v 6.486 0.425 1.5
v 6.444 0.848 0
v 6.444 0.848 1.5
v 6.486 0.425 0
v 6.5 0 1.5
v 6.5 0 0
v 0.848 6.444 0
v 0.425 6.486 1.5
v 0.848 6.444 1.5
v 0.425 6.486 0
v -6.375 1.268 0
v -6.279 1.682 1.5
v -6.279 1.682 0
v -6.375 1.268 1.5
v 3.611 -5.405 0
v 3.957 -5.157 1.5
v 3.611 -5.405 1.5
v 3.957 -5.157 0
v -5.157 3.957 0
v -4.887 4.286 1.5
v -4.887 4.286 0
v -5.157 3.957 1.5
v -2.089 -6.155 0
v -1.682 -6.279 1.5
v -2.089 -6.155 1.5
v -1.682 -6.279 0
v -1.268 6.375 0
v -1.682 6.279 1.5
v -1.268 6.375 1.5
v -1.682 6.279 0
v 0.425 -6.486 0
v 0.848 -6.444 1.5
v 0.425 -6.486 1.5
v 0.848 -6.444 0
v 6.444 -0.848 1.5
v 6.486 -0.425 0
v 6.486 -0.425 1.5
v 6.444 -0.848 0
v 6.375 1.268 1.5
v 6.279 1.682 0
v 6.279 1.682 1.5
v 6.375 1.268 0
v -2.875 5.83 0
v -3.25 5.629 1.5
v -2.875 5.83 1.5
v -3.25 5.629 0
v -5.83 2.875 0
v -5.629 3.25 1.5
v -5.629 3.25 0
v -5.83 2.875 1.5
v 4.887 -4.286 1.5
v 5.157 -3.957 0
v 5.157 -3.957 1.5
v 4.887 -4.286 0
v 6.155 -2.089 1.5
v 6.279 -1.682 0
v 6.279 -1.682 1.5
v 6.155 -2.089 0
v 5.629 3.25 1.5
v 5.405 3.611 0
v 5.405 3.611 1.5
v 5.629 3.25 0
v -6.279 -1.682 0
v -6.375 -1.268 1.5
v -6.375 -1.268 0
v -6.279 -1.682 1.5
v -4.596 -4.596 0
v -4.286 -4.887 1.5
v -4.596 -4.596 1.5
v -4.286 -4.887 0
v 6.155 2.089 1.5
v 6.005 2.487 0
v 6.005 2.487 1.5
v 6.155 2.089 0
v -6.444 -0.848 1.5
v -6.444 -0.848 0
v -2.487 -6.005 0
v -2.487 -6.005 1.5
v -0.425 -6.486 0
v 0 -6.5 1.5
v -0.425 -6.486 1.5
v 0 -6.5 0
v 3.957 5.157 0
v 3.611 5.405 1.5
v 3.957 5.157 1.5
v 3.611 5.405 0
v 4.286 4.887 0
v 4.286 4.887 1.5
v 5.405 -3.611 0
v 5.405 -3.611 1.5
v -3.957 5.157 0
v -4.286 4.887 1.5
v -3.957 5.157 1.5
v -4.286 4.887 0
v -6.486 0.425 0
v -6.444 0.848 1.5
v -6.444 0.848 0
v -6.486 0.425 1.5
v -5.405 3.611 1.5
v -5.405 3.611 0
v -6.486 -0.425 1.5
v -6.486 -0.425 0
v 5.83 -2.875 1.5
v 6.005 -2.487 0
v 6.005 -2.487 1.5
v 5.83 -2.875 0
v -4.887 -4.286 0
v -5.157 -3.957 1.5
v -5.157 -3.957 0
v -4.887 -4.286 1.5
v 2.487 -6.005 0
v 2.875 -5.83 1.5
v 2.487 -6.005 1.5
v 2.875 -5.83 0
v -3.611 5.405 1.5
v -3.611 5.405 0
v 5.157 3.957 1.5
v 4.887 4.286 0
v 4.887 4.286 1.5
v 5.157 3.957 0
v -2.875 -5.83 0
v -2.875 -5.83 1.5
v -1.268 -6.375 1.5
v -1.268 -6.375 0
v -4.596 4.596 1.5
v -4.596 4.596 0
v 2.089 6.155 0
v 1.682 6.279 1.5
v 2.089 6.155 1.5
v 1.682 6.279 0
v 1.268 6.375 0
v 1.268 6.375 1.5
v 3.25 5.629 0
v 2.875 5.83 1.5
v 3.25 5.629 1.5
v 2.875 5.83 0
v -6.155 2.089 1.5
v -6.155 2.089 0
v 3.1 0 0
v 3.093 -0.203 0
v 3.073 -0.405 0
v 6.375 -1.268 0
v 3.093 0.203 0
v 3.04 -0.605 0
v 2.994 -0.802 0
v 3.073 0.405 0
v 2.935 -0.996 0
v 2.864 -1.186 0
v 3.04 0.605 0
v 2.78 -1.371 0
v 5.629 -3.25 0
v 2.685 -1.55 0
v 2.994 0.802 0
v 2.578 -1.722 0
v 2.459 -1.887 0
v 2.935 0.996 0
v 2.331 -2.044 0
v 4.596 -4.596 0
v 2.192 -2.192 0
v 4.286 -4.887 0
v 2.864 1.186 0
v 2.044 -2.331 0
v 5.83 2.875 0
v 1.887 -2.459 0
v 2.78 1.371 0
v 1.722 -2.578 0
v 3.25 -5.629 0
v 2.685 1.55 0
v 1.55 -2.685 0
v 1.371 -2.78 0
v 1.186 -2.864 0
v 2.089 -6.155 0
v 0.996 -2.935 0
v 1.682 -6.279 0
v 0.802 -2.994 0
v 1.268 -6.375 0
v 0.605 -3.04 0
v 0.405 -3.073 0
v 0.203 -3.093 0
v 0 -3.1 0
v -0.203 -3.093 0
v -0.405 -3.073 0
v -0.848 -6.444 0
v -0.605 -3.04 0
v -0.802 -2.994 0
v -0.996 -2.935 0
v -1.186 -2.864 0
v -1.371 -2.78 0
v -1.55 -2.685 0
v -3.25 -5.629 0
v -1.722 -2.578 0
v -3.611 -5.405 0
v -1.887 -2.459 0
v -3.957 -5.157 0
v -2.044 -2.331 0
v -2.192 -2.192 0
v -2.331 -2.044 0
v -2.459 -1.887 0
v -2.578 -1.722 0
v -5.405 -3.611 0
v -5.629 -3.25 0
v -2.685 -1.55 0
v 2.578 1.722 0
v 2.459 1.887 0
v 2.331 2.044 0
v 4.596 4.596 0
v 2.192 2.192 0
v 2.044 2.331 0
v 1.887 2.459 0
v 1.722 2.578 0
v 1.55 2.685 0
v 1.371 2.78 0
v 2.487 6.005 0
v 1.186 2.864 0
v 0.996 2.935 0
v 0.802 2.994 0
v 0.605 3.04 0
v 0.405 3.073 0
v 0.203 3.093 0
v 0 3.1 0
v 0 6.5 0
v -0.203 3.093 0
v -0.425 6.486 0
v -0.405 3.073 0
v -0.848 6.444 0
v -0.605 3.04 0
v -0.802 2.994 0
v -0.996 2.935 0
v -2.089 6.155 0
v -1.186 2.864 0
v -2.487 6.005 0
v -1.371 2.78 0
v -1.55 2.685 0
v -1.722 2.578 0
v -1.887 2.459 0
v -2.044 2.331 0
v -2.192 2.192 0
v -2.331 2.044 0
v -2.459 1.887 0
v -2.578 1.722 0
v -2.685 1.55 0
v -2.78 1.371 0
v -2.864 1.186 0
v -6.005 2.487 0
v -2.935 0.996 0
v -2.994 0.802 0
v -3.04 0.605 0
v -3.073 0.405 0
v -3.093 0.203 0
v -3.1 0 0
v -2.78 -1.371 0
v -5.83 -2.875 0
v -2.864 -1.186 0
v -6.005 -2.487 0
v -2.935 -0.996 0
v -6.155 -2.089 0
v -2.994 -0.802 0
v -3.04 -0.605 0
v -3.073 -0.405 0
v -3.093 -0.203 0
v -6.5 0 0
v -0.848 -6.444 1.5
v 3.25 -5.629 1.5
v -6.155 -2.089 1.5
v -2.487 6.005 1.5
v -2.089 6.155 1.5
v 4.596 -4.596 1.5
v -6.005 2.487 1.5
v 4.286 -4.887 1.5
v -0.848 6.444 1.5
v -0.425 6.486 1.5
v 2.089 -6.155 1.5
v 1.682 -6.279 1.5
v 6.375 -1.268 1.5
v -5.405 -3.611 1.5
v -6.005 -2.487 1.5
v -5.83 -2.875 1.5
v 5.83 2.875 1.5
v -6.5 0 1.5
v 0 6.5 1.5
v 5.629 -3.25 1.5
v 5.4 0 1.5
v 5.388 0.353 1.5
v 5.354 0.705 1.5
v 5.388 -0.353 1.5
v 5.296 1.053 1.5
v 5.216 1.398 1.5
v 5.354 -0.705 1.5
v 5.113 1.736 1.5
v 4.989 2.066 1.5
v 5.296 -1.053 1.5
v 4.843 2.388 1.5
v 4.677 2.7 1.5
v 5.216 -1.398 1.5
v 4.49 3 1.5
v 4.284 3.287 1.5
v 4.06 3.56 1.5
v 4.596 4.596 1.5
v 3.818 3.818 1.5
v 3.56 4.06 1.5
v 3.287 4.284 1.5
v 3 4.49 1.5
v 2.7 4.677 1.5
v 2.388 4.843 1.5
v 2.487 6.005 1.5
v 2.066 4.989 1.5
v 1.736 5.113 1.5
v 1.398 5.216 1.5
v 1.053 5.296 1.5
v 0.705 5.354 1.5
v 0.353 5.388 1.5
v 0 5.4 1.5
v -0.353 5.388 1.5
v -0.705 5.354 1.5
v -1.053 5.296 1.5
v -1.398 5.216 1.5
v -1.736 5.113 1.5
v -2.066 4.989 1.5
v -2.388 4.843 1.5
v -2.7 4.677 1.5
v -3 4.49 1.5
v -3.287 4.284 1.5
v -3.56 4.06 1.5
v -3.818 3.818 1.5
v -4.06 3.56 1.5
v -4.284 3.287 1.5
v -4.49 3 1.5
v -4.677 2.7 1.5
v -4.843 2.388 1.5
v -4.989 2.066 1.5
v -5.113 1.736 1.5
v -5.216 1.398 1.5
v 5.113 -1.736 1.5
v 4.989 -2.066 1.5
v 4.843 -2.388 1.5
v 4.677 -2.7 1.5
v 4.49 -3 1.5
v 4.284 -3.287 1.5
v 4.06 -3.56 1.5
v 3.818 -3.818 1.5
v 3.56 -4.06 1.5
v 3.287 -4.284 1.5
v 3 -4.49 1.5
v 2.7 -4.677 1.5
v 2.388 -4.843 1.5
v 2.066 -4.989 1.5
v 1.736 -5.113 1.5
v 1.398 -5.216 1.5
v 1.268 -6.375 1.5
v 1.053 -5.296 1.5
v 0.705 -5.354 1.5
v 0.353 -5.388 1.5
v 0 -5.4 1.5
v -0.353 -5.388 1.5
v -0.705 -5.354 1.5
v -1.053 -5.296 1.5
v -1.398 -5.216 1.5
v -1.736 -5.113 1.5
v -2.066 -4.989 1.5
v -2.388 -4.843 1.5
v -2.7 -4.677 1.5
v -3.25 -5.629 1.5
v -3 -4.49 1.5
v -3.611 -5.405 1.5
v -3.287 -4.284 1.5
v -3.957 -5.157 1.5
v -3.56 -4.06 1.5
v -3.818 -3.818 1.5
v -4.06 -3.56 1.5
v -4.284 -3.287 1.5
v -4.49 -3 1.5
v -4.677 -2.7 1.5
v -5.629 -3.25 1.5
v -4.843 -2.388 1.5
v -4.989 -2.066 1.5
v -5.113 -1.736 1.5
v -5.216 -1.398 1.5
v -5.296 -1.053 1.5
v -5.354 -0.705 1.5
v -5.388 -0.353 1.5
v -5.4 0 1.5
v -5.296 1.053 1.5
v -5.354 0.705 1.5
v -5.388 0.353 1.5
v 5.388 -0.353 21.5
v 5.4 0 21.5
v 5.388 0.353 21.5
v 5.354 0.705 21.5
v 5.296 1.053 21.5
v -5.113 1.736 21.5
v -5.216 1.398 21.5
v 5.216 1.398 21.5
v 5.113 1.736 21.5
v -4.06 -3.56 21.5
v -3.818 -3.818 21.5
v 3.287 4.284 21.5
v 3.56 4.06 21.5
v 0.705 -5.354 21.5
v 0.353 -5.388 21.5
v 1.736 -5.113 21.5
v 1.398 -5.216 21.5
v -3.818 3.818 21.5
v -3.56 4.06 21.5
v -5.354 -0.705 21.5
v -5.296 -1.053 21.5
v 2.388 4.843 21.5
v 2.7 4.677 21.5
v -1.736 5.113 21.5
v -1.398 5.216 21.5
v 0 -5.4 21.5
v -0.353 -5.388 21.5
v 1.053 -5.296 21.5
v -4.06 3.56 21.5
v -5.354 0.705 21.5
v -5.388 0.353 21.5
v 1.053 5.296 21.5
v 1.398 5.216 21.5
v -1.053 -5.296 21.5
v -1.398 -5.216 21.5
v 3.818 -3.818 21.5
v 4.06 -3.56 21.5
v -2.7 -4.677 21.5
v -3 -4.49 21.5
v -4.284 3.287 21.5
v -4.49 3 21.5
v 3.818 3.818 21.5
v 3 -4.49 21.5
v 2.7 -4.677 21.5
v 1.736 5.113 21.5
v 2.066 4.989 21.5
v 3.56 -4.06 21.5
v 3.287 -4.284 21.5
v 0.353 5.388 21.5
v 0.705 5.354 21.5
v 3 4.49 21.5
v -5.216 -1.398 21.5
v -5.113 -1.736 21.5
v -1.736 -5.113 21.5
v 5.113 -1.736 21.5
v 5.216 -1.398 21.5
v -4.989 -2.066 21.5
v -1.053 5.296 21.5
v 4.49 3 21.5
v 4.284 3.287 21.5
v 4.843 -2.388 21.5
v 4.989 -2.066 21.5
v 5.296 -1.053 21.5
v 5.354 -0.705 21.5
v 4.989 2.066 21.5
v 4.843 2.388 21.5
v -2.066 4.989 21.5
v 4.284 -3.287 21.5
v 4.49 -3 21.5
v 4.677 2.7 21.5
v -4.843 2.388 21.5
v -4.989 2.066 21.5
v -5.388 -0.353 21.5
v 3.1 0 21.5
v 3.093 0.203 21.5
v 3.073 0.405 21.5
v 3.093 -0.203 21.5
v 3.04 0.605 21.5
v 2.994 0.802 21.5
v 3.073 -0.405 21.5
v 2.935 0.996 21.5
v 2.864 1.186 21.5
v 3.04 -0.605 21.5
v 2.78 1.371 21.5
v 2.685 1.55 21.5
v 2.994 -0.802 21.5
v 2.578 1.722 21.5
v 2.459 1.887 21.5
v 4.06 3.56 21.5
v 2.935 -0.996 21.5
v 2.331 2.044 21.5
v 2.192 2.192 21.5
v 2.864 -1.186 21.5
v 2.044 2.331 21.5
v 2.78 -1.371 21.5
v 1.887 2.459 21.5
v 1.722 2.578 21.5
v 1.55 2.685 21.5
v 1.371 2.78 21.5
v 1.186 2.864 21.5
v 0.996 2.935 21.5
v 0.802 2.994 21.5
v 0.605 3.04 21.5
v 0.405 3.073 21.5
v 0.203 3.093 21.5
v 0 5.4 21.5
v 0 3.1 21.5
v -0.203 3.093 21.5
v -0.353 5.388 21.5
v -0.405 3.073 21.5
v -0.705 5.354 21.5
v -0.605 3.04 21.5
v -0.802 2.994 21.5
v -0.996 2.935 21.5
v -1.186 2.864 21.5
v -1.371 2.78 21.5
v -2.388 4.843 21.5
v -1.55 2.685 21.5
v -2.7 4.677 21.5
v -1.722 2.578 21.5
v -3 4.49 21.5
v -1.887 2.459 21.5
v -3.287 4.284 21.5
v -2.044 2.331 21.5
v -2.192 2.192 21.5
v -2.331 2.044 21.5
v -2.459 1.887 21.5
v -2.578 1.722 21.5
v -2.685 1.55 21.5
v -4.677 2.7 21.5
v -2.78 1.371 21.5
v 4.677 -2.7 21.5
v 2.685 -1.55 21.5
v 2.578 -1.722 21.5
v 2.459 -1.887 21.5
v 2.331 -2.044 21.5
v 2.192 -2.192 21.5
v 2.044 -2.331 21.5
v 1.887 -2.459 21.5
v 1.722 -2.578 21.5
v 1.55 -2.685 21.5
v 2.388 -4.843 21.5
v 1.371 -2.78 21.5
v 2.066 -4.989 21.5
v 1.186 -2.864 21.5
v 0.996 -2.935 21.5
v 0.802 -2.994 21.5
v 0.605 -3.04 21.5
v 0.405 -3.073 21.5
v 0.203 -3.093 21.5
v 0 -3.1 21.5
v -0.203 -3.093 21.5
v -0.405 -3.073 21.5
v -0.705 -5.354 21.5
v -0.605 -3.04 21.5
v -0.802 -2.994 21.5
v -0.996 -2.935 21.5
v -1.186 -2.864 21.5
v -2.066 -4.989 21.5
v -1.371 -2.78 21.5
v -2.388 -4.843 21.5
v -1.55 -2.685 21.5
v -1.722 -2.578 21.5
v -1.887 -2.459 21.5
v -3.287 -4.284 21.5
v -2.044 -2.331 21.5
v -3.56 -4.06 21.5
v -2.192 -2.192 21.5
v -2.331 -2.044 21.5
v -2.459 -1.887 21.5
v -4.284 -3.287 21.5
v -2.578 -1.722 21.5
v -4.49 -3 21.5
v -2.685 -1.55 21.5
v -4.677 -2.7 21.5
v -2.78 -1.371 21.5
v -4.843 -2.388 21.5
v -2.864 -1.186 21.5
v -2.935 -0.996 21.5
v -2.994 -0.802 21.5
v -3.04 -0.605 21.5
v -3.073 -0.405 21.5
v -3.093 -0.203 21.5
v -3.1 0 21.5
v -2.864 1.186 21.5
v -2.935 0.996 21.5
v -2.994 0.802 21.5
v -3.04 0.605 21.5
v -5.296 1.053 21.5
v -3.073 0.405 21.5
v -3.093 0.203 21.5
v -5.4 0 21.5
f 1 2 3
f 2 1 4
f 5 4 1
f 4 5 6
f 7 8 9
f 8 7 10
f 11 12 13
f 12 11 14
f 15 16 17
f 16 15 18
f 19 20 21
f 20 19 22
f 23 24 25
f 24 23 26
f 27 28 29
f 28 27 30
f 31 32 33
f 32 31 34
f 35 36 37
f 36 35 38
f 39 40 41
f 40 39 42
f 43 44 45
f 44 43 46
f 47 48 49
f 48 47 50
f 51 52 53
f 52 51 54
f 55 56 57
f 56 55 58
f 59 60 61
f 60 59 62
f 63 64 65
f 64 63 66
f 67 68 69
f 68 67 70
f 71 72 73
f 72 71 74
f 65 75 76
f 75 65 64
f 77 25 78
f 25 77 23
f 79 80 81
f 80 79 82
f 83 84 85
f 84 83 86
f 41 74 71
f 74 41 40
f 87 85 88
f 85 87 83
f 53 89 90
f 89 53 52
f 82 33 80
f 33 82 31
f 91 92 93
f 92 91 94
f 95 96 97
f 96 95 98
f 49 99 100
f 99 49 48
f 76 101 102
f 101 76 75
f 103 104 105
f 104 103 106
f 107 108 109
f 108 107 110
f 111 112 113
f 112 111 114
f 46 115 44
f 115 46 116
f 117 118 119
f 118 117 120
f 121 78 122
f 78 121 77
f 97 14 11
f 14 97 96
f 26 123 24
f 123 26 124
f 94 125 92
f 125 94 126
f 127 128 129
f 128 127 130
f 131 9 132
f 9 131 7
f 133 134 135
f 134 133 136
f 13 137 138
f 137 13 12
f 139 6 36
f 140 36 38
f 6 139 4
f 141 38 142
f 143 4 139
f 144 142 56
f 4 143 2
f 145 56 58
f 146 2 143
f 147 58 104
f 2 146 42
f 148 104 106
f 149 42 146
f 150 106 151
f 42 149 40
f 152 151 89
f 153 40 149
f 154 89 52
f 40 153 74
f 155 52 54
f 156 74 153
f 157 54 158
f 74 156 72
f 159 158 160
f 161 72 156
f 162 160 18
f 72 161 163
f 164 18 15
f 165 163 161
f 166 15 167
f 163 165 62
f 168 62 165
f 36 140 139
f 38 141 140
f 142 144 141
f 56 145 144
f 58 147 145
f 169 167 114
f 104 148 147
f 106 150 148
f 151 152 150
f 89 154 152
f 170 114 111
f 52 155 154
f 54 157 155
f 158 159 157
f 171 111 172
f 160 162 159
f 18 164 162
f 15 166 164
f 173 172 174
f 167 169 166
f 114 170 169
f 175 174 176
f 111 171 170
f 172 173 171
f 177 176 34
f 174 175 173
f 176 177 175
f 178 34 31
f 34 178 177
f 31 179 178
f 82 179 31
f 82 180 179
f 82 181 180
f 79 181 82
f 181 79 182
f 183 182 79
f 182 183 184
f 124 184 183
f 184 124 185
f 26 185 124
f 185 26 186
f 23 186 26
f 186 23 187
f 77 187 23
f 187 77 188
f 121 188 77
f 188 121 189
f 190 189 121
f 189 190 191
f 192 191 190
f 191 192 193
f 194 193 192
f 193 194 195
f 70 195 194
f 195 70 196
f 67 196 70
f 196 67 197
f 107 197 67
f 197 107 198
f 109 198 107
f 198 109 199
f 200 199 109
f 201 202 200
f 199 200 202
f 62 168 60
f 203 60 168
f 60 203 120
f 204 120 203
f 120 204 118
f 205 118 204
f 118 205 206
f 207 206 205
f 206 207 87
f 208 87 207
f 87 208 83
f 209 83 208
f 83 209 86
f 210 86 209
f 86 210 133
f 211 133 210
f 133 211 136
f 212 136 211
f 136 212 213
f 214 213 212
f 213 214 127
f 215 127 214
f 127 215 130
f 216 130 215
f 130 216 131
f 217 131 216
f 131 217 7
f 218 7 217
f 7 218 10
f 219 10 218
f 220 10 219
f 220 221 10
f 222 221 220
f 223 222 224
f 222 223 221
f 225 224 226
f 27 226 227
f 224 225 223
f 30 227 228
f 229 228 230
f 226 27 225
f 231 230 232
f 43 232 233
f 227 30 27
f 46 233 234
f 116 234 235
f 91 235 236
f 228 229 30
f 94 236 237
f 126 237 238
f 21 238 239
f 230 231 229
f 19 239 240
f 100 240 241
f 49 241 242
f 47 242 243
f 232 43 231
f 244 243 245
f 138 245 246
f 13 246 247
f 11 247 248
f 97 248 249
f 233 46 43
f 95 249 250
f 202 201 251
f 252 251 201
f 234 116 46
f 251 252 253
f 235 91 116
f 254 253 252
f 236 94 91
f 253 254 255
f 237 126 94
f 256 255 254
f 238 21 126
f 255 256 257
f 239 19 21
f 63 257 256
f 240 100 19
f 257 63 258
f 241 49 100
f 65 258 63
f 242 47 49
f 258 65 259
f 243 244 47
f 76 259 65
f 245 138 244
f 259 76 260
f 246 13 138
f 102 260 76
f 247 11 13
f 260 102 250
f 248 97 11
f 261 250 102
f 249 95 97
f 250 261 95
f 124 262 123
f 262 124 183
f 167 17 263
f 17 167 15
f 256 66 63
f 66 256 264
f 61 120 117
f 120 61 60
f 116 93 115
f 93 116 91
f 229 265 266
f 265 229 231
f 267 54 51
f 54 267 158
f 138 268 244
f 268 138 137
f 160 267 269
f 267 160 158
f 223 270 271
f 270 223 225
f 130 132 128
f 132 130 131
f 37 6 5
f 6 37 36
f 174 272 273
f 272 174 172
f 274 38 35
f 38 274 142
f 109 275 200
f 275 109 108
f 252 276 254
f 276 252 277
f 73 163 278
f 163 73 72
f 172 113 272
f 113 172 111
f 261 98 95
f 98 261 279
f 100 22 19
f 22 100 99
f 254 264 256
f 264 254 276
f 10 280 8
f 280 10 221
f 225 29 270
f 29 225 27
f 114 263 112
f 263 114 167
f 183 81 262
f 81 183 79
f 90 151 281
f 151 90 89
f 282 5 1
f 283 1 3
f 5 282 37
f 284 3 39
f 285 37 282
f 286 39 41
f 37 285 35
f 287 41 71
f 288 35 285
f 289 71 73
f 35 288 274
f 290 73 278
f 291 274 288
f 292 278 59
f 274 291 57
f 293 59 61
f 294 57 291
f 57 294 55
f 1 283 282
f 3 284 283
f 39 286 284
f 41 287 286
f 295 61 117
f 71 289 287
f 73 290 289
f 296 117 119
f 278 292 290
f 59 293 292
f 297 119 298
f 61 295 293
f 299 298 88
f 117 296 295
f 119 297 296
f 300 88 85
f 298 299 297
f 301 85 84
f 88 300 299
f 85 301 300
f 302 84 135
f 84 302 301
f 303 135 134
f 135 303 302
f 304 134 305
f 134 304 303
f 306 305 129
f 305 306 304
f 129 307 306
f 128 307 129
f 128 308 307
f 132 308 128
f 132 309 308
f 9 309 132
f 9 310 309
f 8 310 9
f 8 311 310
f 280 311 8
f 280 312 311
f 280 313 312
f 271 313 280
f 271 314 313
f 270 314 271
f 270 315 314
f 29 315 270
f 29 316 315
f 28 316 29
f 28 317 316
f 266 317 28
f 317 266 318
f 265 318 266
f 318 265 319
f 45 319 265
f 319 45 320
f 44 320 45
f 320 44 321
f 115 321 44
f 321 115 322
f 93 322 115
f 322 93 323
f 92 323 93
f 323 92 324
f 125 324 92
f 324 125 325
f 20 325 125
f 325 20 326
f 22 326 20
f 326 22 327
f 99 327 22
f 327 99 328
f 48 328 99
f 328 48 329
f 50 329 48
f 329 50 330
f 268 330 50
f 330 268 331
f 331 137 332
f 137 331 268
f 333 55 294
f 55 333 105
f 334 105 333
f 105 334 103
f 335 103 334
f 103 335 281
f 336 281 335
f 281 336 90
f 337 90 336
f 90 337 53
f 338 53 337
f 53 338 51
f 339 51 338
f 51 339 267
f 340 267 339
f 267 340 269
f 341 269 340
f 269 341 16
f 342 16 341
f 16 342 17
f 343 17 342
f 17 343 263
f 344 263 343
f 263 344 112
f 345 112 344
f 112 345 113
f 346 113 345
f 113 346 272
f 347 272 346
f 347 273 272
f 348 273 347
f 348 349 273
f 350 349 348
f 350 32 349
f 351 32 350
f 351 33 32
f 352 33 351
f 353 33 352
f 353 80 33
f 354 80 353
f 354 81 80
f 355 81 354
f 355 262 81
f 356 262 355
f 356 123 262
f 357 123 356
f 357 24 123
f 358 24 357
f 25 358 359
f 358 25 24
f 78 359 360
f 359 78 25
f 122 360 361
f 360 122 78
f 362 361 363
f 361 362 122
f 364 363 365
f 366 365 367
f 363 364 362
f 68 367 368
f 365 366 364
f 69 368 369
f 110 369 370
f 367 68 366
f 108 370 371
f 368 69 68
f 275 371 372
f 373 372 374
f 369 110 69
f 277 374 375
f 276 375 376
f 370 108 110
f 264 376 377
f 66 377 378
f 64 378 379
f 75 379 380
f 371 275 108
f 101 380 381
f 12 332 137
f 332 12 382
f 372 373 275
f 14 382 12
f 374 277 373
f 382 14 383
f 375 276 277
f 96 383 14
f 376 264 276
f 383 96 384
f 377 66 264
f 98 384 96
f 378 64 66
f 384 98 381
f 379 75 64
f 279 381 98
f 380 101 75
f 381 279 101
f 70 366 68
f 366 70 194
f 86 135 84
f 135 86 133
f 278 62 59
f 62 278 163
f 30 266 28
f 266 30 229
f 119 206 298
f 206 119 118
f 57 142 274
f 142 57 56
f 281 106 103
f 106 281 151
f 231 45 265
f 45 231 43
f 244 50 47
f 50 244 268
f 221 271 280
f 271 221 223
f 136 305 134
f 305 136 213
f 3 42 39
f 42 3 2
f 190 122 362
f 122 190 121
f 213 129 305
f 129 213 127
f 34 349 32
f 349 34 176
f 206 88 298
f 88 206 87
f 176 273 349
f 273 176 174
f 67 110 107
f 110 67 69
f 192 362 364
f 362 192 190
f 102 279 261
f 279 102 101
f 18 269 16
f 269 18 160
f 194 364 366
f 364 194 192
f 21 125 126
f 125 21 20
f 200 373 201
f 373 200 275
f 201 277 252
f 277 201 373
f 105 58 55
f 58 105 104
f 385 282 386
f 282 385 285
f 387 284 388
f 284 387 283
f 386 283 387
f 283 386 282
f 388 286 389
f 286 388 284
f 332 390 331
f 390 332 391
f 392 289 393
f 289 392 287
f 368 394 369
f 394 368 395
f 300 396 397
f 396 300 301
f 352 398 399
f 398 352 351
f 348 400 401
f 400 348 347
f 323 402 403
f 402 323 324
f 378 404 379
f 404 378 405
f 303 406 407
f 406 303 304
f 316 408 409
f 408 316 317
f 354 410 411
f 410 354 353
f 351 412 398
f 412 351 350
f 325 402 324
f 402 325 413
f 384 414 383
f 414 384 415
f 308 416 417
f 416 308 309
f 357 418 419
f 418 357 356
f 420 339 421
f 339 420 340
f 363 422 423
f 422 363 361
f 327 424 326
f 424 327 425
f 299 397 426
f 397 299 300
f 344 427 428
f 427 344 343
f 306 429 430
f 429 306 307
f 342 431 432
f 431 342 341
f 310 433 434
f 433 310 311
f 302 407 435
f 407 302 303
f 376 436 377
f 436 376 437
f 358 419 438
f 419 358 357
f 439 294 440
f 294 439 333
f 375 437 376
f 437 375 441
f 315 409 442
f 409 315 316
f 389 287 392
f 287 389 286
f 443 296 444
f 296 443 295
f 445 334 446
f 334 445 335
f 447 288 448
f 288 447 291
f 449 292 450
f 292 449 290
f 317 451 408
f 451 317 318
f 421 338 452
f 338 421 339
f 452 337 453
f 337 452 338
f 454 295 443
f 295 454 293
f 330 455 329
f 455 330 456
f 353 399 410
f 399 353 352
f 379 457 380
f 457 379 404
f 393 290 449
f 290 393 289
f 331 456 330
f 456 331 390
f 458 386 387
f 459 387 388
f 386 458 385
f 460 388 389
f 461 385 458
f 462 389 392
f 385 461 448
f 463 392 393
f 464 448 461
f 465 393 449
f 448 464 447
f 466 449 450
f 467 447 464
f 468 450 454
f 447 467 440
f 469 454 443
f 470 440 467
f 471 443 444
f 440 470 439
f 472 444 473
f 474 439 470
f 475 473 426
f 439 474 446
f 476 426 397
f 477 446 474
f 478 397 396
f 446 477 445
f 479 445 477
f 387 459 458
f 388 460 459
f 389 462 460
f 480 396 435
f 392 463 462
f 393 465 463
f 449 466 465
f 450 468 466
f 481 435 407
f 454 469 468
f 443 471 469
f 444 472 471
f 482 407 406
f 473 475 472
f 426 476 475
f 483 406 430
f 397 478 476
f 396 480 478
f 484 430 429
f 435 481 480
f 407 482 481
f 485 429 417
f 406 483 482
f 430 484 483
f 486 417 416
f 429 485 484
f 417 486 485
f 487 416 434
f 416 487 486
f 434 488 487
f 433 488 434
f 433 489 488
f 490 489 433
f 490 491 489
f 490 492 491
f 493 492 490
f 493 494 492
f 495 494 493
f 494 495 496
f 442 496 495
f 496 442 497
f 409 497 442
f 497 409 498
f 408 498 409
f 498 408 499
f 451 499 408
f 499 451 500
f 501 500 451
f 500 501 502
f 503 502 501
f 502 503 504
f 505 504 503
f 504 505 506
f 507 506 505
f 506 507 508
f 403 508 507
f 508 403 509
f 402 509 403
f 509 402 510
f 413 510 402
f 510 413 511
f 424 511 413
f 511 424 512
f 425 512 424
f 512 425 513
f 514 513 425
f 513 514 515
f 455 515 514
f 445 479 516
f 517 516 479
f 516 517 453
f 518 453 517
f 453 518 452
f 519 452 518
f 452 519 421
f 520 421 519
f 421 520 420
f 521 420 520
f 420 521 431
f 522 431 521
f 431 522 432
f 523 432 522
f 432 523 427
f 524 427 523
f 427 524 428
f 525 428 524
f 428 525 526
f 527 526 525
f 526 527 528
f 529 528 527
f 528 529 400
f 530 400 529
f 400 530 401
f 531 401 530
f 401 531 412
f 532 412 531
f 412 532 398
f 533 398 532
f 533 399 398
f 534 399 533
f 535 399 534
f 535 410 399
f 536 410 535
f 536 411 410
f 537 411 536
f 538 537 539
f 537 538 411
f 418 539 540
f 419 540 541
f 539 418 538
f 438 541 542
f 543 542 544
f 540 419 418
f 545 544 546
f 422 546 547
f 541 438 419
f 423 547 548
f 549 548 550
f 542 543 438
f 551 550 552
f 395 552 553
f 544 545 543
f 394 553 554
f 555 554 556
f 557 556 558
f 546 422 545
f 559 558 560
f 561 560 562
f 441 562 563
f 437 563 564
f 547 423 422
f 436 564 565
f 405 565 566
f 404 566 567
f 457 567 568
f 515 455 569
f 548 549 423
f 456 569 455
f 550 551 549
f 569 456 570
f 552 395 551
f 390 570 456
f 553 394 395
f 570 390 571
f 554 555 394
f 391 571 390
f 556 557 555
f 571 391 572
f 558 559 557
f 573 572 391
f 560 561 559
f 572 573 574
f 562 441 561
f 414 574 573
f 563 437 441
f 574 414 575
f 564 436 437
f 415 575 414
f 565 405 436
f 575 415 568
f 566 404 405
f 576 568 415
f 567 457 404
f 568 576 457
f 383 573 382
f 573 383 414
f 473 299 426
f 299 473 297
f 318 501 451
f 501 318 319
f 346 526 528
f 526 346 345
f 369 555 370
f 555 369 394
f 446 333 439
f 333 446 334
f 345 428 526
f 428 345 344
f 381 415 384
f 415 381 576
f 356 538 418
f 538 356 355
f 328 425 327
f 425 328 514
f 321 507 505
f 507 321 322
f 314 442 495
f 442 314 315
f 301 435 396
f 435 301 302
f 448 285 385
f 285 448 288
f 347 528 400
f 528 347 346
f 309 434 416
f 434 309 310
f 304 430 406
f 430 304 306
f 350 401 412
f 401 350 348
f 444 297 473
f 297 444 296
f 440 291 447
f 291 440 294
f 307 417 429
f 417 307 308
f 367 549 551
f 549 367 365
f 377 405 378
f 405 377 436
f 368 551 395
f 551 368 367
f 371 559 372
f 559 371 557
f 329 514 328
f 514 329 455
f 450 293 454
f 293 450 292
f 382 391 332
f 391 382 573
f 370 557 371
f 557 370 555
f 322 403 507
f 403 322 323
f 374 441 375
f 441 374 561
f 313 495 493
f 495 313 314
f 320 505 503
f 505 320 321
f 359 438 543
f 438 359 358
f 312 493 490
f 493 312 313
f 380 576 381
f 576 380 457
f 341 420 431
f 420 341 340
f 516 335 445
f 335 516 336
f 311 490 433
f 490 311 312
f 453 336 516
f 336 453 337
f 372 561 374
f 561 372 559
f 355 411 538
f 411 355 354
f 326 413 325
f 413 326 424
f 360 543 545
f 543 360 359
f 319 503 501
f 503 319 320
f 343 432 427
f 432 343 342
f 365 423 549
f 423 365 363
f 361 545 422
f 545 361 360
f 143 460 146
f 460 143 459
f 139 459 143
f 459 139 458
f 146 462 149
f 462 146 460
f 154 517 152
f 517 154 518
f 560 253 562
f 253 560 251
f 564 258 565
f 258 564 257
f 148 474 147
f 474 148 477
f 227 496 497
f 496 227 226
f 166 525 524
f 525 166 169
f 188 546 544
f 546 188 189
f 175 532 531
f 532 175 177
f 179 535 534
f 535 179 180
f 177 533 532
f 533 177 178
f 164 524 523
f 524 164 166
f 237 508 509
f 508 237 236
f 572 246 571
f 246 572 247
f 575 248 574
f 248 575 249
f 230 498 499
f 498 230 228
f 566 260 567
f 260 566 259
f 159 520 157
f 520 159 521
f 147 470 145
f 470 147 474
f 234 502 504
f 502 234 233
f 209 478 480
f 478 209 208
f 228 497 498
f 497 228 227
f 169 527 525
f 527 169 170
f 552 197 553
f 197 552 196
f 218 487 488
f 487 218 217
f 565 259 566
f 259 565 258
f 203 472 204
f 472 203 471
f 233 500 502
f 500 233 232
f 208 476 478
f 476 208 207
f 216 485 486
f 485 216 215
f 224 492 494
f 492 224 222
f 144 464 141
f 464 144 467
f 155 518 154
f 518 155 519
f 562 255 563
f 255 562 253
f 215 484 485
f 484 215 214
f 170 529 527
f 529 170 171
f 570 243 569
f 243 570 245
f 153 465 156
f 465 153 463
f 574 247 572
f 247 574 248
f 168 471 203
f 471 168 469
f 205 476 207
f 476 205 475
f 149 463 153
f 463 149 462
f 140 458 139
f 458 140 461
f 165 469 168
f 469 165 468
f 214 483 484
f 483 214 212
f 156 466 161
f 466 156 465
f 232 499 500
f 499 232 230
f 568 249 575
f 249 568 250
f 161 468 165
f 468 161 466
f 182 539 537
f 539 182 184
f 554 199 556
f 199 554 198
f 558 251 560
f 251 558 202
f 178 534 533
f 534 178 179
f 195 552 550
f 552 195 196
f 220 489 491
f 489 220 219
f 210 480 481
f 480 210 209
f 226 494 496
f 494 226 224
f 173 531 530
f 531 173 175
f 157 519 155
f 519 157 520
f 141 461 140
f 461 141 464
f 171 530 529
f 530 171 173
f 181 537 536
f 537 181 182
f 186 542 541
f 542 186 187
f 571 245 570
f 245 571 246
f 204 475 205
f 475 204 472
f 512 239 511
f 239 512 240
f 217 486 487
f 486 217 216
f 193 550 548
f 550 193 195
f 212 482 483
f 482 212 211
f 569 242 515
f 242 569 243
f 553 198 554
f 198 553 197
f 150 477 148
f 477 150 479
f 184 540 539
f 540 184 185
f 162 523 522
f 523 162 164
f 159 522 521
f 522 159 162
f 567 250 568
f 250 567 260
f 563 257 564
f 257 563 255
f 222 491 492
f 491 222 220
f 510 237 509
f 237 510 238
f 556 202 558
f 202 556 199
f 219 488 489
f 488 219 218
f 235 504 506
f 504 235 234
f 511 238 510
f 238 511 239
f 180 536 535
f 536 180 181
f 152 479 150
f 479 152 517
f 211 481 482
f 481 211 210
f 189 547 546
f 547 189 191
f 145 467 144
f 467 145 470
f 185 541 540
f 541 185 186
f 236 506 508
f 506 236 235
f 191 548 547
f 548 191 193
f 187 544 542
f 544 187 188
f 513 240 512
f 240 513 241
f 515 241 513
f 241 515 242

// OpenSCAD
// PCR tube adapter sleeve - print upside down
// Units: mm

$fn = 96;

// --- Dimensions ---
collar_d      = 13;    // collar outer diameter (on bed)
collar_h      = 1.5;   // collar thickness (z = 0 to 1.5)
sleeve_od     = 10.8;  // sleeve outer diameter
sleeve_top_z  = 21.5;  // top of sleeve body (z)
bore_d        = 6.2;   // through-bore diameter
eps           = 0.5;   // cutter overshoot past faces

difference() {
    union() {
        // Collar
        cylinder(d = collar_d, h = collar_h);
        // Sleeve body (overlaps slightly into collar for a clean union)
        translate([0, 0, collar_h - 0.01])
            cylinder(d = sleeve_od, h = sleeve_top_z - collar_h + 0.01);
    }
    // Through bore
    translate([0, 0, -eps])
        cylinder(d = bore_d, h = sleeve_top_z + 2 * eps);
}
